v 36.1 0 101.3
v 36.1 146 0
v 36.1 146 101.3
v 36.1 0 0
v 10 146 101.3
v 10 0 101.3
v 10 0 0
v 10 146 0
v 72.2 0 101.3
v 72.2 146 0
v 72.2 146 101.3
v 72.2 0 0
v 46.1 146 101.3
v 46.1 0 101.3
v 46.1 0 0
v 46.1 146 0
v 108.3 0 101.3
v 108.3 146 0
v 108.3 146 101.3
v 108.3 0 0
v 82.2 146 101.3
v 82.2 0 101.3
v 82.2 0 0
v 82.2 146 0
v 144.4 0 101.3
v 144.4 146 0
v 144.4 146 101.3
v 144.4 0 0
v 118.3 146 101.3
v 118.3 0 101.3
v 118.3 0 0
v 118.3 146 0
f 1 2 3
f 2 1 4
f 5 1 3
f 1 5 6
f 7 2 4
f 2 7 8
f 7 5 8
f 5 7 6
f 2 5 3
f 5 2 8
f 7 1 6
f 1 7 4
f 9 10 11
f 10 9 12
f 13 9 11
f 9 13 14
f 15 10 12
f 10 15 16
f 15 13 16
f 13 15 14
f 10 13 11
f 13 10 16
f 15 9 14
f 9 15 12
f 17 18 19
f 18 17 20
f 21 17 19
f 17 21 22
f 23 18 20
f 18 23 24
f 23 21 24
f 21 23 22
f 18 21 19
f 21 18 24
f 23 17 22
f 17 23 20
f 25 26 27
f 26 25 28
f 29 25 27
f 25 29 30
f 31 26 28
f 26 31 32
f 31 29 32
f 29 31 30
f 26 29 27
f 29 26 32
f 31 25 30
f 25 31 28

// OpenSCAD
disk35height = 26.1;
disk35widht = 101.3;
disk35length = 146;

module disk35(trans = [0,0,0], height=disk35height) {    
    translate(trans) {
        cube([height,disk35length,disk35widht]);
    }
}

// Standarddybde er 203.2mm, men det er det kanskje greit å skjære av i blant.
module ramme(trans = [0,0,0], length = disk35length, disker=1) {
    translate(trans) {
        difference() {
            cube([146.1,depth,41.3]);
            translate([0.5,0,0.5]) {
                cube([145.1,depth,40.3]);
            }
        }
    }
}

// Hvis vi har 15mm høye disker (ikke så vanlig)
module 4disk(trans = [0,0,0]) {
    translate(trans) {
        disk35(trans = [2,1,2]);
        disk35(trans = [2,1,22]);
        disk35(trans = [73.85,1,2]);
        disk35(trans = [73.85,1,22]);
    }
}


//ramme();
//4disk();
translate([10,0,0]) {
    disk35();
}
translate([disk35height+20,0,0]) {
    disk35();
}
translate([disk35height*2+30,0,0]) {
    disk35();
}
translate([disk35height*3+40,0,0]) {
    disk35();
}
